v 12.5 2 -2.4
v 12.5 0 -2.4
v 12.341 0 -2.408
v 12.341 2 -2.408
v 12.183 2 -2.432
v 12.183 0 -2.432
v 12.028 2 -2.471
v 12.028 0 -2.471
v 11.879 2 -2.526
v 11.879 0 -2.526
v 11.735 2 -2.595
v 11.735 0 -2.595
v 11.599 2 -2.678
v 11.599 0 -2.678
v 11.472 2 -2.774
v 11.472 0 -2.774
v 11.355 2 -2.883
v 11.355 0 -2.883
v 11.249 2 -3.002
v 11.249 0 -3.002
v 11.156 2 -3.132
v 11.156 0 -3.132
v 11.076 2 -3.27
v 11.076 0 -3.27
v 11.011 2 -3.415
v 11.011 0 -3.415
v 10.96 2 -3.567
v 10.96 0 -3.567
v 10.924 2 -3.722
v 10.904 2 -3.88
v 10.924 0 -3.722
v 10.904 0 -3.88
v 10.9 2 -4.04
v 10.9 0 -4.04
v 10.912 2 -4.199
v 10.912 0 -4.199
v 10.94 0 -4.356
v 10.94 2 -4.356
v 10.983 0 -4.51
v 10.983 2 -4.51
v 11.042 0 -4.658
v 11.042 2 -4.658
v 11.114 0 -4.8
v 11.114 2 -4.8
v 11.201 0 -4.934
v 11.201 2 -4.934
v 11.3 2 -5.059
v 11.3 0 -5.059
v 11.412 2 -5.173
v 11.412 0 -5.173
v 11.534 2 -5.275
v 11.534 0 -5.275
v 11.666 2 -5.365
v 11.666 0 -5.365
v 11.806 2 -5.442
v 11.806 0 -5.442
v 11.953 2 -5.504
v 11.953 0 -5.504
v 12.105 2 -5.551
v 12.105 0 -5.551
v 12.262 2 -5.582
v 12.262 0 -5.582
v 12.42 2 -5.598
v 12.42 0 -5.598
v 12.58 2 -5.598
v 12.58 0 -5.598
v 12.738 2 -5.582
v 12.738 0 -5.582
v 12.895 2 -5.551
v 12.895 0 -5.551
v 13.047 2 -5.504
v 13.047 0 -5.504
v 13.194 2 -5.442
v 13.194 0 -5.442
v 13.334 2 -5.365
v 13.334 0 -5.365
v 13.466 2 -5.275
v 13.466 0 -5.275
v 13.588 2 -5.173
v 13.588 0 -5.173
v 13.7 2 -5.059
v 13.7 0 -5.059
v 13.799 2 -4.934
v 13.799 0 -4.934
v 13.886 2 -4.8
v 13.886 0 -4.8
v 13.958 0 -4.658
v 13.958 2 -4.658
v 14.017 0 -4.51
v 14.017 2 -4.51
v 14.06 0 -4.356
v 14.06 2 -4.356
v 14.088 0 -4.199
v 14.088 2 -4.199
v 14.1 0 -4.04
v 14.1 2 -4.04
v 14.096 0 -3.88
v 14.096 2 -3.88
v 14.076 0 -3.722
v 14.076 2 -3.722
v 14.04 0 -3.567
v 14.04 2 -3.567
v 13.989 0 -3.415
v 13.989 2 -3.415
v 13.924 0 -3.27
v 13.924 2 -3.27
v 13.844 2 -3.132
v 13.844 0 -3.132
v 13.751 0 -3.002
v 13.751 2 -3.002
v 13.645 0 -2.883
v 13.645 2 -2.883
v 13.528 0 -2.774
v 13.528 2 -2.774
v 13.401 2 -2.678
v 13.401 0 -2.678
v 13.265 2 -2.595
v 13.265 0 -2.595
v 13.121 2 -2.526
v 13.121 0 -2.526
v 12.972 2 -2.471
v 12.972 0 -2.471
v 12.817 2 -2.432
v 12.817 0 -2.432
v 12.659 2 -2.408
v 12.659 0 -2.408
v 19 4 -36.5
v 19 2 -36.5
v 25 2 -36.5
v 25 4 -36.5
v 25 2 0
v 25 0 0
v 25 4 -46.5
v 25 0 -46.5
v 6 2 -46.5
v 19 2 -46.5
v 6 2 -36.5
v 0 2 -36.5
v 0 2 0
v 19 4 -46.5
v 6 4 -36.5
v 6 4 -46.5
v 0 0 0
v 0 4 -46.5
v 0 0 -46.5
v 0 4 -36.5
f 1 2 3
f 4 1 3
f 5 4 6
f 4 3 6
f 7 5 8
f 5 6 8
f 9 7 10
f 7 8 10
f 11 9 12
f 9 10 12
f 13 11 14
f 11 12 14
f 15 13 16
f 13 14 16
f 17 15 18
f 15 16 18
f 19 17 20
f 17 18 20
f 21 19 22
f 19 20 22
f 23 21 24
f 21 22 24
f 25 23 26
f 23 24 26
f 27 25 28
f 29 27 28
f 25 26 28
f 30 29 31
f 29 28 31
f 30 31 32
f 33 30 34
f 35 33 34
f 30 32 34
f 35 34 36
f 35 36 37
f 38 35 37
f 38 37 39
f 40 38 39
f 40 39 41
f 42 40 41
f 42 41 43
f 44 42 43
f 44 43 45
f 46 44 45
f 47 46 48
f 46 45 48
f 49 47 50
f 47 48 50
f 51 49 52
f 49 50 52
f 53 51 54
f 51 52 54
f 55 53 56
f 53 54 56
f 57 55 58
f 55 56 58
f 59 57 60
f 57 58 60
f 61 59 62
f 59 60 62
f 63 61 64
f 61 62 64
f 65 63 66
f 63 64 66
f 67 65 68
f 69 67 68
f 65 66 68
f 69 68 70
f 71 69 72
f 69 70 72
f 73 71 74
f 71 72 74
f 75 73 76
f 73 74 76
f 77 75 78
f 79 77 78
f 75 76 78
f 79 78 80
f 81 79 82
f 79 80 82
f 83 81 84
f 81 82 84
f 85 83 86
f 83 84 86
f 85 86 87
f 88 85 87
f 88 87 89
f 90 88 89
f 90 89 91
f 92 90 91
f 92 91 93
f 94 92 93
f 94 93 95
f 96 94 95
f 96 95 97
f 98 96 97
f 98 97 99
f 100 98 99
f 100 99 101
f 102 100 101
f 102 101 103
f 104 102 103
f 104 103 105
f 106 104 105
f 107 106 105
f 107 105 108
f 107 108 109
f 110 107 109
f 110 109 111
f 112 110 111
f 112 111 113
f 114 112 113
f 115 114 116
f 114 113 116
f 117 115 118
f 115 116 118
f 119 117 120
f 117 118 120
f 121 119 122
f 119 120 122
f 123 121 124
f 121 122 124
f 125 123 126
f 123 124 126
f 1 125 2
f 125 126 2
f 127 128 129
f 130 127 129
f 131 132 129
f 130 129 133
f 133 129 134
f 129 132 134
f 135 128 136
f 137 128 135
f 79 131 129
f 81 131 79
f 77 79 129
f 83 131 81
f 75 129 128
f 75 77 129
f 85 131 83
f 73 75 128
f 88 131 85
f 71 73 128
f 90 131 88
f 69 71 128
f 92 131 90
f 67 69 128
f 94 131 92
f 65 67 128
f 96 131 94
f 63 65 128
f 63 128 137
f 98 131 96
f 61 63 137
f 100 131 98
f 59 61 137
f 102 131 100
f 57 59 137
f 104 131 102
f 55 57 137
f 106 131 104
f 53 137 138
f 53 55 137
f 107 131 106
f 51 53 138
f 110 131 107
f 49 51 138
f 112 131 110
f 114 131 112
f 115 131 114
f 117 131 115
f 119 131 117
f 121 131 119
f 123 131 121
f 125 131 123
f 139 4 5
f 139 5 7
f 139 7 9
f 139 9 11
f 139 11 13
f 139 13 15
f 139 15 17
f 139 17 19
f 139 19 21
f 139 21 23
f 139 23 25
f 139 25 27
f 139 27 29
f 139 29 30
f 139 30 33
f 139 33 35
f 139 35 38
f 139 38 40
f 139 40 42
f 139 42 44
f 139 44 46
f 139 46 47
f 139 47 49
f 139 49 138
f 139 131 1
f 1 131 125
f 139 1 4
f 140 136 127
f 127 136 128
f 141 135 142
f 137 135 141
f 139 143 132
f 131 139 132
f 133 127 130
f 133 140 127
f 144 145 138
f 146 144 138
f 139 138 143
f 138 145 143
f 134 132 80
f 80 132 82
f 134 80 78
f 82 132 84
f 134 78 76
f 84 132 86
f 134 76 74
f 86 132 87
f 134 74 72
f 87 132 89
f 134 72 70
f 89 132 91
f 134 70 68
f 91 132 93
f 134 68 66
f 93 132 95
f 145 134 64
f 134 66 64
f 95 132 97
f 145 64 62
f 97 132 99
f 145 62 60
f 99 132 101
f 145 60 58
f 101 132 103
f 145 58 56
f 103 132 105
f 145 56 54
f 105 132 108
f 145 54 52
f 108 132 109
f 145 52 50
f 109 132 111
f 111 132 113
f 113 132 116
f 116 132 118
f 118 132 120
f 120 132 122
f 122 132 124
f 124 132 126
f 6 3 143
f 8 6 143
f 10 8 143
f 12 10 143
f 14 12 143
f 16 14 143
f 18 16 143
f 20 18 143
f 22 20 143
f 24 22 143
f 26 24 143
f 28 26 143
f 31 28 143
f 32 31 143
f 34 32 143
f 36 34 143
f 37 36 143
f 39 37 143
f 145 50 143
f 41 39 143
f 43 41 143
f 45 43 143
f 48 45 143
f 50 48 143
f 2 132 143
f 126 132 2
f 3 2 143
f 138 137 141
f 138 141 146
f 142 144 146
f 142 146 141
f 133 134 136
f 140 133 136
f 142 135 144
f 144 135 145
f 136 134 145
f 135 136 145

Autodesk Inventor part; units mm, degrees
ref_plane "YZ Plane" through (0, 0, 0) normal (1, 0, 0) x (0, 1, 0)
ref_plane "XZ Plane" through (0, 0, 0) normal (0, 1, 0) x (-1, 0, 0)
ref_plane "XY Plane" through (0, 0, 0) normal (0, 0, 1) x (1, 0, 0)
sketch "Sketch1" plane through (0, 0, 0) normal (0, 1, 0) x (-1, 0, 0)
  line L0 (0, 0) -> (-25, 0)
  line L1 (-25, 0) -> (-25, -46.5)
  line L2 (-25, -46.5) -> (0, -46.5)
  line L3 (0, -46.5) -> (0, 0)
  dimension "d0" = 25
  dimension "d1" = 46.5
extrude "Extrusion1" add sketch "Sketch1" along normal blind 2
sketch "Sketch2" plane through (0, 2, 0) normal (0, 1, 0) x (1, 0, 0)
  line L0 (25, 46.5) -> (0, 46.5) projected
  line L1 (0, 46.5) -> (6, 46.5)
  line L2 (6, 46.5) -> (6, 36.5)
  line L3 (6, 36.5) -> (0, 36.5)
  line L4 (0, 36.5) -> (0, 46.5)
  line L5 (25, 46.5) -> (19, 46.5)
  line L6 (19, 46.5) -> (19, 36.5)
  line L7 (19, 36.5) -> (25, 36.5)
  line L8 (25, 36.5) -> (25, 46.5)
  point P0 (0, 0)
  dimension "d4" = 6
  dimension "d5" = 10
  dimension "d6" = 6
extrude "Extrusion2" add sketch "Sketch2" along normal blind 2
sketch "Sketch3" plane through (0, 2, 0) normal (0, 1, 0) x (1, 0, 0)
  line L0 (0, 0) -> (25, 0) projected
  line L1 (25, 0) -> (25, 36.5) projected
  point P0 (12.5, 4)
  dimension "d9" = 4
  dimension "d10" = 12.5
hole "Hole1" at (12.5, 2, -4) direction (0, -1, 0) diameter 3.2 end through all
properties part number "mlx_mount_2mm"
